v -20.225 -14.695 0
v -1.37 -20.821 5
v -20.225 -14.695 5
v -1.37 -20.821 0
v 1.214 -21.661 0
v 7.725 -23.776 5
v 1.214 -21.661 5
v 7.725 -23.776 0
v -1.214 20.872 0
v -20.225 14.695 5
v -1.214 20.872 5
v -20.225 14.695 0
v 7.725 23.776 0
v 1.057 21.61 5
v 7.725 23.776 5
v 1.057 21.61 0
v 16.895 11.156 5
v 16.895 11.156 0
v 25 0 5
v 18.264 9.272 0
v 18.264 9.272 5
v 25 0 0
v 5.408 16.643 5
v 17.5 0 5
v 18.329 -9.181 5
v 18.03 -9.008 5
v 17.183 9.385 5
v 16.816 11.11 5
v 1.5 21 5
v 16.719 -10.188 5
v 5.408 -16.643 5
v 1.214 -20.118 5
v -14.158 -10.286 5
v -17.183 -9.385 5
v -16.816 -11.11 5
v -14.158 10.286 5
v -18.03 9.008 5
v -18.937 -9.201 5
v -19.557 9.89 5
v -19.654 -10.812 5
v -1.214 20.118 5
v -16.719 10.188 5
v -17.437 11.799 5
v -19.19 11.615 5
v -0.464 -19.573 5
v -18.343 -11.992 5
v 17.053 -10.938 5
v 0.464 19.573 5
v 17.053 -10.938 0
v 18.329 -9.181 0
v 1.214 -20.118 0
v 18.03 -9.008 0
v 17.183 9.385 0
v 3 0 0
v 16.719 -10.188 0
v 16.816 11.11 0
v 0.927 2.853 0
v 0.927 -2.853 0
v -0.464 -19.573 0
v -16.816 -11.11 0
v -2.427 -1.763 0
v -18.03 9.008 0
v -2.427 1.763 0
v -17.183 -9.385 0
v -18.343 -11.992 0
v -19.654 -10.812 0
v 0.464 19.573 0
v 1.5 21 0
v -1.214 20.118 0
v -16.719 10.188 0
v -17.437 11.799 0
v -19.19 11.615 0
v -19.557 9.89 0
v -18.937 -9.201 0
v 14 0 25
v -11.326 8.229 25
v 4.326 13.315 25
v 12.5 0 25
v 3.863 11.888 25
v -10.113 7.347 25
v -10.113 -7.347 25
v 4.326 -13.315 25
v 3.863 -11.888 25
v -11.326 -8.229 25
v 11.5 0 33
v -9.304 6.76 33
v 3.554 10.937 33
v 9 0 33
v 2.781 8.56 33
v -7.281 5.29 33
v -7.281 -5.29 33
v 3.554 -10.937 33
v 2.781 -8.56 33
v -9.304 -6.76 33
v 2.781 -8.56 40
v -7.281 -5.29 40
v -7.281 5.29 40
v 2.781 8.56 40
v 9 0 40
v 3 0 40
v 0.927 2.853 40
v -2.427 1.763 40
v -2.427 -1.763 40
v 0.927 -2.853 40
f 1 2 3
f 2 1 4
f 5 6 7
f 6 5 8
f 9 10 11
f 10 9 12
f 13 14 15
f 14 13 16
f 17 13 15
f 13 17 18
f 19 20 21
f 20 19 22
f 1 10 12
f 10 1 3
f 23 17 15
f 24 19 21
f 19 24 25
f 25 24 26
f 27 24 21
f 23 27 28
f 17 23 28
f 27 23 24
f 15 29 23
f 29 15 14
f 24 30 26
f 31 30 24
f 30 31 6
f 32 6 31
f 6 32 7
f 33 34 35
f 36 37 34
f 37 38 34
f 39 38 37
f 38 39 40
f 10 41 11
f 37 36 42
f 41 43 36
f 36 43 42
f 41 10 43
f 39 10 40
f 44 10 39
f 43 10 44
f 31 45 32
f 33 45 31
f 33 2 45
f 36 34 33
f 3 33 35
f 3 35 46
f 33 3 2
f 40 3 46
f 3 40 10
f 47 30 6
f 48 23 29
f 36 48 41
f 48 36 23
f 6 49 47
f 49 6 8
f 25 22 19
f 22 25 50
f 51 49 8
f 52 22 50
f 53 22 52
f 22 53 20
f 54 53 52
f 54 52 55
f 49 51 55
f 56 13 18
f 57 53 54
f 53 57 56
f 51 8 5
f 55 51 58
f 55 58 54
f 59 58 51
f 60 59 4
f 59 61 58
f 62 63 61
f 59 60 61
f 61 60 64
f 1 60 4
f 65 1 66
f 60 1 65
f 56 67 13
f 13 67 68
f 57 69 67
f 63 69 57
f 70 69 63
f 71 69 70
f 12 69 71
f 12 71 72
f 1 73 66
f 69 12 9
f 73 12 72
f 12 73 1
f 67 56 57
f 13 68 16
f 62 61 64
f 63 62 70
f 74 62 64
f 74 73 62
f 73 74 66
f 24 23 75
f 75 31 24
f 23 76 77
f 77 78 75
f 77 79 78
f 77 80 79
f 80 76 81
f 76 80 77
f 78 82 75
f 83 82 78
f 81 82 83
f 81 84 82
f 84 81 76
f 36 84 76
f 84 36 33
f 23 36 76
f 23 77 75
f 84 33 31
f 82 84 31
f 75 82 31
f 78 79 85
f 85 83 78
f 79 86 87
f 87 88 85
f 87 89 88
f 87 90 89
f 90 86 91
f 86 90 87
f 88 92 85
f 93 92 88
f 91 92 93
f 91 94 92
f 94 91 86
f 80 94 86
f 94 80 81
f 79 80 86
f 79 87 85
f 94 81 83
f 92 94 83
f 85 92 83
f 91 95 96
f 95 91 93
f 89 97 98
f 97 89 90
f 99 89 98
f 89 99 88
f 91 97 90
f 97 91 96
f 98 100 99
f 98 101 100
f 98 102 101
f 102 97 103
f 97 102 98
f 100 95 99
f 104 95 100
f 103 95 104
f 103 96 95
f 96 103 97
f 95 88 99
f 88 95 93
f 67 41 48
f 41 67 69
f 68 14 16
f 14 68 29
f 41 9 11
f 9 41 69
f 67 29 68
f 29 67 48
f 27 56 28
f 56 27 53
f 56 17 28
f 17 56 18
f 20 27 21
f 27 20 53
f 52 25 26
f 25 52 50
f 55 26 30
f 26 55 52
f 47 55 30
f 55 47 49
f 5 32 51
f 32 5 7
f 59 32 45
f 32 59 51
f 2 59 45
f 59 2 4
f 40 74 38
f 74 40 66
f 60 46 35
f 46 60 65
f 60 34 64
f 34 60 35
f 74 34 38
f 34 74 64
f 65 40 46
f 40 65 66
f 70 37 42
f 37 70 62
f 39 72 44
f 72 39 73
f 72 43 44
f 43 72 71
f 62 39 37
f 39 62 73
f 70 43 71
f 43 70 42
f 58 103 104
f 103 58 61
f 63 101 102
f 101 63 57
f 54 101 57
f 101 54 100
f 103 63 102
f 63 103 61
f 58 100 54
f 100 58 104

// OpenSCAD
$fs = 100;

// Leg hose connector for a Ghostbusters uniform

hoseDiameter = 6;
screwDiameter = 3;

difference() {
    solidConnector();
    translate([0,0,-1])
    cylinder(
        d=hoseDiameter,
        h=50
    );
    Radial_Array(
        a=60,
        n=6,
        r=21
    ) {
        translate([0,0,-1])
        cylinder(
            d=screwDiameter,
            h=6
        );
    }
}

module solidConnector() {
    union() {
        cylinder(
            d=50,
            h=5
        );
        translate([0,0,5])
        cylinder(
            d1=35,
            d2=28,
            h=20
        );
        translate([0,0,25])
        cylinder(
            d1=25,
            d2=23,
            h=8
        );
        translate([0,0,33])
        cylinder(
            d=18,
            h=7
        );
    }
}

// http://forum.openscad.org/What-is-happening-here-tp5193p5205.html
//Radial_Array(a,n,r){child object}
// produces a clockwise radial array of child objects rotated around the local z axis   
// a= interval angle 
// n= number of objects 
// r= radius distance 
//
module Radial_Array(a,n,r)
{
    for (k=[0:n-1])
    {
        rotate([0,0,-(a*k)])
        translate([0,r,0])
        child();
    }
}
